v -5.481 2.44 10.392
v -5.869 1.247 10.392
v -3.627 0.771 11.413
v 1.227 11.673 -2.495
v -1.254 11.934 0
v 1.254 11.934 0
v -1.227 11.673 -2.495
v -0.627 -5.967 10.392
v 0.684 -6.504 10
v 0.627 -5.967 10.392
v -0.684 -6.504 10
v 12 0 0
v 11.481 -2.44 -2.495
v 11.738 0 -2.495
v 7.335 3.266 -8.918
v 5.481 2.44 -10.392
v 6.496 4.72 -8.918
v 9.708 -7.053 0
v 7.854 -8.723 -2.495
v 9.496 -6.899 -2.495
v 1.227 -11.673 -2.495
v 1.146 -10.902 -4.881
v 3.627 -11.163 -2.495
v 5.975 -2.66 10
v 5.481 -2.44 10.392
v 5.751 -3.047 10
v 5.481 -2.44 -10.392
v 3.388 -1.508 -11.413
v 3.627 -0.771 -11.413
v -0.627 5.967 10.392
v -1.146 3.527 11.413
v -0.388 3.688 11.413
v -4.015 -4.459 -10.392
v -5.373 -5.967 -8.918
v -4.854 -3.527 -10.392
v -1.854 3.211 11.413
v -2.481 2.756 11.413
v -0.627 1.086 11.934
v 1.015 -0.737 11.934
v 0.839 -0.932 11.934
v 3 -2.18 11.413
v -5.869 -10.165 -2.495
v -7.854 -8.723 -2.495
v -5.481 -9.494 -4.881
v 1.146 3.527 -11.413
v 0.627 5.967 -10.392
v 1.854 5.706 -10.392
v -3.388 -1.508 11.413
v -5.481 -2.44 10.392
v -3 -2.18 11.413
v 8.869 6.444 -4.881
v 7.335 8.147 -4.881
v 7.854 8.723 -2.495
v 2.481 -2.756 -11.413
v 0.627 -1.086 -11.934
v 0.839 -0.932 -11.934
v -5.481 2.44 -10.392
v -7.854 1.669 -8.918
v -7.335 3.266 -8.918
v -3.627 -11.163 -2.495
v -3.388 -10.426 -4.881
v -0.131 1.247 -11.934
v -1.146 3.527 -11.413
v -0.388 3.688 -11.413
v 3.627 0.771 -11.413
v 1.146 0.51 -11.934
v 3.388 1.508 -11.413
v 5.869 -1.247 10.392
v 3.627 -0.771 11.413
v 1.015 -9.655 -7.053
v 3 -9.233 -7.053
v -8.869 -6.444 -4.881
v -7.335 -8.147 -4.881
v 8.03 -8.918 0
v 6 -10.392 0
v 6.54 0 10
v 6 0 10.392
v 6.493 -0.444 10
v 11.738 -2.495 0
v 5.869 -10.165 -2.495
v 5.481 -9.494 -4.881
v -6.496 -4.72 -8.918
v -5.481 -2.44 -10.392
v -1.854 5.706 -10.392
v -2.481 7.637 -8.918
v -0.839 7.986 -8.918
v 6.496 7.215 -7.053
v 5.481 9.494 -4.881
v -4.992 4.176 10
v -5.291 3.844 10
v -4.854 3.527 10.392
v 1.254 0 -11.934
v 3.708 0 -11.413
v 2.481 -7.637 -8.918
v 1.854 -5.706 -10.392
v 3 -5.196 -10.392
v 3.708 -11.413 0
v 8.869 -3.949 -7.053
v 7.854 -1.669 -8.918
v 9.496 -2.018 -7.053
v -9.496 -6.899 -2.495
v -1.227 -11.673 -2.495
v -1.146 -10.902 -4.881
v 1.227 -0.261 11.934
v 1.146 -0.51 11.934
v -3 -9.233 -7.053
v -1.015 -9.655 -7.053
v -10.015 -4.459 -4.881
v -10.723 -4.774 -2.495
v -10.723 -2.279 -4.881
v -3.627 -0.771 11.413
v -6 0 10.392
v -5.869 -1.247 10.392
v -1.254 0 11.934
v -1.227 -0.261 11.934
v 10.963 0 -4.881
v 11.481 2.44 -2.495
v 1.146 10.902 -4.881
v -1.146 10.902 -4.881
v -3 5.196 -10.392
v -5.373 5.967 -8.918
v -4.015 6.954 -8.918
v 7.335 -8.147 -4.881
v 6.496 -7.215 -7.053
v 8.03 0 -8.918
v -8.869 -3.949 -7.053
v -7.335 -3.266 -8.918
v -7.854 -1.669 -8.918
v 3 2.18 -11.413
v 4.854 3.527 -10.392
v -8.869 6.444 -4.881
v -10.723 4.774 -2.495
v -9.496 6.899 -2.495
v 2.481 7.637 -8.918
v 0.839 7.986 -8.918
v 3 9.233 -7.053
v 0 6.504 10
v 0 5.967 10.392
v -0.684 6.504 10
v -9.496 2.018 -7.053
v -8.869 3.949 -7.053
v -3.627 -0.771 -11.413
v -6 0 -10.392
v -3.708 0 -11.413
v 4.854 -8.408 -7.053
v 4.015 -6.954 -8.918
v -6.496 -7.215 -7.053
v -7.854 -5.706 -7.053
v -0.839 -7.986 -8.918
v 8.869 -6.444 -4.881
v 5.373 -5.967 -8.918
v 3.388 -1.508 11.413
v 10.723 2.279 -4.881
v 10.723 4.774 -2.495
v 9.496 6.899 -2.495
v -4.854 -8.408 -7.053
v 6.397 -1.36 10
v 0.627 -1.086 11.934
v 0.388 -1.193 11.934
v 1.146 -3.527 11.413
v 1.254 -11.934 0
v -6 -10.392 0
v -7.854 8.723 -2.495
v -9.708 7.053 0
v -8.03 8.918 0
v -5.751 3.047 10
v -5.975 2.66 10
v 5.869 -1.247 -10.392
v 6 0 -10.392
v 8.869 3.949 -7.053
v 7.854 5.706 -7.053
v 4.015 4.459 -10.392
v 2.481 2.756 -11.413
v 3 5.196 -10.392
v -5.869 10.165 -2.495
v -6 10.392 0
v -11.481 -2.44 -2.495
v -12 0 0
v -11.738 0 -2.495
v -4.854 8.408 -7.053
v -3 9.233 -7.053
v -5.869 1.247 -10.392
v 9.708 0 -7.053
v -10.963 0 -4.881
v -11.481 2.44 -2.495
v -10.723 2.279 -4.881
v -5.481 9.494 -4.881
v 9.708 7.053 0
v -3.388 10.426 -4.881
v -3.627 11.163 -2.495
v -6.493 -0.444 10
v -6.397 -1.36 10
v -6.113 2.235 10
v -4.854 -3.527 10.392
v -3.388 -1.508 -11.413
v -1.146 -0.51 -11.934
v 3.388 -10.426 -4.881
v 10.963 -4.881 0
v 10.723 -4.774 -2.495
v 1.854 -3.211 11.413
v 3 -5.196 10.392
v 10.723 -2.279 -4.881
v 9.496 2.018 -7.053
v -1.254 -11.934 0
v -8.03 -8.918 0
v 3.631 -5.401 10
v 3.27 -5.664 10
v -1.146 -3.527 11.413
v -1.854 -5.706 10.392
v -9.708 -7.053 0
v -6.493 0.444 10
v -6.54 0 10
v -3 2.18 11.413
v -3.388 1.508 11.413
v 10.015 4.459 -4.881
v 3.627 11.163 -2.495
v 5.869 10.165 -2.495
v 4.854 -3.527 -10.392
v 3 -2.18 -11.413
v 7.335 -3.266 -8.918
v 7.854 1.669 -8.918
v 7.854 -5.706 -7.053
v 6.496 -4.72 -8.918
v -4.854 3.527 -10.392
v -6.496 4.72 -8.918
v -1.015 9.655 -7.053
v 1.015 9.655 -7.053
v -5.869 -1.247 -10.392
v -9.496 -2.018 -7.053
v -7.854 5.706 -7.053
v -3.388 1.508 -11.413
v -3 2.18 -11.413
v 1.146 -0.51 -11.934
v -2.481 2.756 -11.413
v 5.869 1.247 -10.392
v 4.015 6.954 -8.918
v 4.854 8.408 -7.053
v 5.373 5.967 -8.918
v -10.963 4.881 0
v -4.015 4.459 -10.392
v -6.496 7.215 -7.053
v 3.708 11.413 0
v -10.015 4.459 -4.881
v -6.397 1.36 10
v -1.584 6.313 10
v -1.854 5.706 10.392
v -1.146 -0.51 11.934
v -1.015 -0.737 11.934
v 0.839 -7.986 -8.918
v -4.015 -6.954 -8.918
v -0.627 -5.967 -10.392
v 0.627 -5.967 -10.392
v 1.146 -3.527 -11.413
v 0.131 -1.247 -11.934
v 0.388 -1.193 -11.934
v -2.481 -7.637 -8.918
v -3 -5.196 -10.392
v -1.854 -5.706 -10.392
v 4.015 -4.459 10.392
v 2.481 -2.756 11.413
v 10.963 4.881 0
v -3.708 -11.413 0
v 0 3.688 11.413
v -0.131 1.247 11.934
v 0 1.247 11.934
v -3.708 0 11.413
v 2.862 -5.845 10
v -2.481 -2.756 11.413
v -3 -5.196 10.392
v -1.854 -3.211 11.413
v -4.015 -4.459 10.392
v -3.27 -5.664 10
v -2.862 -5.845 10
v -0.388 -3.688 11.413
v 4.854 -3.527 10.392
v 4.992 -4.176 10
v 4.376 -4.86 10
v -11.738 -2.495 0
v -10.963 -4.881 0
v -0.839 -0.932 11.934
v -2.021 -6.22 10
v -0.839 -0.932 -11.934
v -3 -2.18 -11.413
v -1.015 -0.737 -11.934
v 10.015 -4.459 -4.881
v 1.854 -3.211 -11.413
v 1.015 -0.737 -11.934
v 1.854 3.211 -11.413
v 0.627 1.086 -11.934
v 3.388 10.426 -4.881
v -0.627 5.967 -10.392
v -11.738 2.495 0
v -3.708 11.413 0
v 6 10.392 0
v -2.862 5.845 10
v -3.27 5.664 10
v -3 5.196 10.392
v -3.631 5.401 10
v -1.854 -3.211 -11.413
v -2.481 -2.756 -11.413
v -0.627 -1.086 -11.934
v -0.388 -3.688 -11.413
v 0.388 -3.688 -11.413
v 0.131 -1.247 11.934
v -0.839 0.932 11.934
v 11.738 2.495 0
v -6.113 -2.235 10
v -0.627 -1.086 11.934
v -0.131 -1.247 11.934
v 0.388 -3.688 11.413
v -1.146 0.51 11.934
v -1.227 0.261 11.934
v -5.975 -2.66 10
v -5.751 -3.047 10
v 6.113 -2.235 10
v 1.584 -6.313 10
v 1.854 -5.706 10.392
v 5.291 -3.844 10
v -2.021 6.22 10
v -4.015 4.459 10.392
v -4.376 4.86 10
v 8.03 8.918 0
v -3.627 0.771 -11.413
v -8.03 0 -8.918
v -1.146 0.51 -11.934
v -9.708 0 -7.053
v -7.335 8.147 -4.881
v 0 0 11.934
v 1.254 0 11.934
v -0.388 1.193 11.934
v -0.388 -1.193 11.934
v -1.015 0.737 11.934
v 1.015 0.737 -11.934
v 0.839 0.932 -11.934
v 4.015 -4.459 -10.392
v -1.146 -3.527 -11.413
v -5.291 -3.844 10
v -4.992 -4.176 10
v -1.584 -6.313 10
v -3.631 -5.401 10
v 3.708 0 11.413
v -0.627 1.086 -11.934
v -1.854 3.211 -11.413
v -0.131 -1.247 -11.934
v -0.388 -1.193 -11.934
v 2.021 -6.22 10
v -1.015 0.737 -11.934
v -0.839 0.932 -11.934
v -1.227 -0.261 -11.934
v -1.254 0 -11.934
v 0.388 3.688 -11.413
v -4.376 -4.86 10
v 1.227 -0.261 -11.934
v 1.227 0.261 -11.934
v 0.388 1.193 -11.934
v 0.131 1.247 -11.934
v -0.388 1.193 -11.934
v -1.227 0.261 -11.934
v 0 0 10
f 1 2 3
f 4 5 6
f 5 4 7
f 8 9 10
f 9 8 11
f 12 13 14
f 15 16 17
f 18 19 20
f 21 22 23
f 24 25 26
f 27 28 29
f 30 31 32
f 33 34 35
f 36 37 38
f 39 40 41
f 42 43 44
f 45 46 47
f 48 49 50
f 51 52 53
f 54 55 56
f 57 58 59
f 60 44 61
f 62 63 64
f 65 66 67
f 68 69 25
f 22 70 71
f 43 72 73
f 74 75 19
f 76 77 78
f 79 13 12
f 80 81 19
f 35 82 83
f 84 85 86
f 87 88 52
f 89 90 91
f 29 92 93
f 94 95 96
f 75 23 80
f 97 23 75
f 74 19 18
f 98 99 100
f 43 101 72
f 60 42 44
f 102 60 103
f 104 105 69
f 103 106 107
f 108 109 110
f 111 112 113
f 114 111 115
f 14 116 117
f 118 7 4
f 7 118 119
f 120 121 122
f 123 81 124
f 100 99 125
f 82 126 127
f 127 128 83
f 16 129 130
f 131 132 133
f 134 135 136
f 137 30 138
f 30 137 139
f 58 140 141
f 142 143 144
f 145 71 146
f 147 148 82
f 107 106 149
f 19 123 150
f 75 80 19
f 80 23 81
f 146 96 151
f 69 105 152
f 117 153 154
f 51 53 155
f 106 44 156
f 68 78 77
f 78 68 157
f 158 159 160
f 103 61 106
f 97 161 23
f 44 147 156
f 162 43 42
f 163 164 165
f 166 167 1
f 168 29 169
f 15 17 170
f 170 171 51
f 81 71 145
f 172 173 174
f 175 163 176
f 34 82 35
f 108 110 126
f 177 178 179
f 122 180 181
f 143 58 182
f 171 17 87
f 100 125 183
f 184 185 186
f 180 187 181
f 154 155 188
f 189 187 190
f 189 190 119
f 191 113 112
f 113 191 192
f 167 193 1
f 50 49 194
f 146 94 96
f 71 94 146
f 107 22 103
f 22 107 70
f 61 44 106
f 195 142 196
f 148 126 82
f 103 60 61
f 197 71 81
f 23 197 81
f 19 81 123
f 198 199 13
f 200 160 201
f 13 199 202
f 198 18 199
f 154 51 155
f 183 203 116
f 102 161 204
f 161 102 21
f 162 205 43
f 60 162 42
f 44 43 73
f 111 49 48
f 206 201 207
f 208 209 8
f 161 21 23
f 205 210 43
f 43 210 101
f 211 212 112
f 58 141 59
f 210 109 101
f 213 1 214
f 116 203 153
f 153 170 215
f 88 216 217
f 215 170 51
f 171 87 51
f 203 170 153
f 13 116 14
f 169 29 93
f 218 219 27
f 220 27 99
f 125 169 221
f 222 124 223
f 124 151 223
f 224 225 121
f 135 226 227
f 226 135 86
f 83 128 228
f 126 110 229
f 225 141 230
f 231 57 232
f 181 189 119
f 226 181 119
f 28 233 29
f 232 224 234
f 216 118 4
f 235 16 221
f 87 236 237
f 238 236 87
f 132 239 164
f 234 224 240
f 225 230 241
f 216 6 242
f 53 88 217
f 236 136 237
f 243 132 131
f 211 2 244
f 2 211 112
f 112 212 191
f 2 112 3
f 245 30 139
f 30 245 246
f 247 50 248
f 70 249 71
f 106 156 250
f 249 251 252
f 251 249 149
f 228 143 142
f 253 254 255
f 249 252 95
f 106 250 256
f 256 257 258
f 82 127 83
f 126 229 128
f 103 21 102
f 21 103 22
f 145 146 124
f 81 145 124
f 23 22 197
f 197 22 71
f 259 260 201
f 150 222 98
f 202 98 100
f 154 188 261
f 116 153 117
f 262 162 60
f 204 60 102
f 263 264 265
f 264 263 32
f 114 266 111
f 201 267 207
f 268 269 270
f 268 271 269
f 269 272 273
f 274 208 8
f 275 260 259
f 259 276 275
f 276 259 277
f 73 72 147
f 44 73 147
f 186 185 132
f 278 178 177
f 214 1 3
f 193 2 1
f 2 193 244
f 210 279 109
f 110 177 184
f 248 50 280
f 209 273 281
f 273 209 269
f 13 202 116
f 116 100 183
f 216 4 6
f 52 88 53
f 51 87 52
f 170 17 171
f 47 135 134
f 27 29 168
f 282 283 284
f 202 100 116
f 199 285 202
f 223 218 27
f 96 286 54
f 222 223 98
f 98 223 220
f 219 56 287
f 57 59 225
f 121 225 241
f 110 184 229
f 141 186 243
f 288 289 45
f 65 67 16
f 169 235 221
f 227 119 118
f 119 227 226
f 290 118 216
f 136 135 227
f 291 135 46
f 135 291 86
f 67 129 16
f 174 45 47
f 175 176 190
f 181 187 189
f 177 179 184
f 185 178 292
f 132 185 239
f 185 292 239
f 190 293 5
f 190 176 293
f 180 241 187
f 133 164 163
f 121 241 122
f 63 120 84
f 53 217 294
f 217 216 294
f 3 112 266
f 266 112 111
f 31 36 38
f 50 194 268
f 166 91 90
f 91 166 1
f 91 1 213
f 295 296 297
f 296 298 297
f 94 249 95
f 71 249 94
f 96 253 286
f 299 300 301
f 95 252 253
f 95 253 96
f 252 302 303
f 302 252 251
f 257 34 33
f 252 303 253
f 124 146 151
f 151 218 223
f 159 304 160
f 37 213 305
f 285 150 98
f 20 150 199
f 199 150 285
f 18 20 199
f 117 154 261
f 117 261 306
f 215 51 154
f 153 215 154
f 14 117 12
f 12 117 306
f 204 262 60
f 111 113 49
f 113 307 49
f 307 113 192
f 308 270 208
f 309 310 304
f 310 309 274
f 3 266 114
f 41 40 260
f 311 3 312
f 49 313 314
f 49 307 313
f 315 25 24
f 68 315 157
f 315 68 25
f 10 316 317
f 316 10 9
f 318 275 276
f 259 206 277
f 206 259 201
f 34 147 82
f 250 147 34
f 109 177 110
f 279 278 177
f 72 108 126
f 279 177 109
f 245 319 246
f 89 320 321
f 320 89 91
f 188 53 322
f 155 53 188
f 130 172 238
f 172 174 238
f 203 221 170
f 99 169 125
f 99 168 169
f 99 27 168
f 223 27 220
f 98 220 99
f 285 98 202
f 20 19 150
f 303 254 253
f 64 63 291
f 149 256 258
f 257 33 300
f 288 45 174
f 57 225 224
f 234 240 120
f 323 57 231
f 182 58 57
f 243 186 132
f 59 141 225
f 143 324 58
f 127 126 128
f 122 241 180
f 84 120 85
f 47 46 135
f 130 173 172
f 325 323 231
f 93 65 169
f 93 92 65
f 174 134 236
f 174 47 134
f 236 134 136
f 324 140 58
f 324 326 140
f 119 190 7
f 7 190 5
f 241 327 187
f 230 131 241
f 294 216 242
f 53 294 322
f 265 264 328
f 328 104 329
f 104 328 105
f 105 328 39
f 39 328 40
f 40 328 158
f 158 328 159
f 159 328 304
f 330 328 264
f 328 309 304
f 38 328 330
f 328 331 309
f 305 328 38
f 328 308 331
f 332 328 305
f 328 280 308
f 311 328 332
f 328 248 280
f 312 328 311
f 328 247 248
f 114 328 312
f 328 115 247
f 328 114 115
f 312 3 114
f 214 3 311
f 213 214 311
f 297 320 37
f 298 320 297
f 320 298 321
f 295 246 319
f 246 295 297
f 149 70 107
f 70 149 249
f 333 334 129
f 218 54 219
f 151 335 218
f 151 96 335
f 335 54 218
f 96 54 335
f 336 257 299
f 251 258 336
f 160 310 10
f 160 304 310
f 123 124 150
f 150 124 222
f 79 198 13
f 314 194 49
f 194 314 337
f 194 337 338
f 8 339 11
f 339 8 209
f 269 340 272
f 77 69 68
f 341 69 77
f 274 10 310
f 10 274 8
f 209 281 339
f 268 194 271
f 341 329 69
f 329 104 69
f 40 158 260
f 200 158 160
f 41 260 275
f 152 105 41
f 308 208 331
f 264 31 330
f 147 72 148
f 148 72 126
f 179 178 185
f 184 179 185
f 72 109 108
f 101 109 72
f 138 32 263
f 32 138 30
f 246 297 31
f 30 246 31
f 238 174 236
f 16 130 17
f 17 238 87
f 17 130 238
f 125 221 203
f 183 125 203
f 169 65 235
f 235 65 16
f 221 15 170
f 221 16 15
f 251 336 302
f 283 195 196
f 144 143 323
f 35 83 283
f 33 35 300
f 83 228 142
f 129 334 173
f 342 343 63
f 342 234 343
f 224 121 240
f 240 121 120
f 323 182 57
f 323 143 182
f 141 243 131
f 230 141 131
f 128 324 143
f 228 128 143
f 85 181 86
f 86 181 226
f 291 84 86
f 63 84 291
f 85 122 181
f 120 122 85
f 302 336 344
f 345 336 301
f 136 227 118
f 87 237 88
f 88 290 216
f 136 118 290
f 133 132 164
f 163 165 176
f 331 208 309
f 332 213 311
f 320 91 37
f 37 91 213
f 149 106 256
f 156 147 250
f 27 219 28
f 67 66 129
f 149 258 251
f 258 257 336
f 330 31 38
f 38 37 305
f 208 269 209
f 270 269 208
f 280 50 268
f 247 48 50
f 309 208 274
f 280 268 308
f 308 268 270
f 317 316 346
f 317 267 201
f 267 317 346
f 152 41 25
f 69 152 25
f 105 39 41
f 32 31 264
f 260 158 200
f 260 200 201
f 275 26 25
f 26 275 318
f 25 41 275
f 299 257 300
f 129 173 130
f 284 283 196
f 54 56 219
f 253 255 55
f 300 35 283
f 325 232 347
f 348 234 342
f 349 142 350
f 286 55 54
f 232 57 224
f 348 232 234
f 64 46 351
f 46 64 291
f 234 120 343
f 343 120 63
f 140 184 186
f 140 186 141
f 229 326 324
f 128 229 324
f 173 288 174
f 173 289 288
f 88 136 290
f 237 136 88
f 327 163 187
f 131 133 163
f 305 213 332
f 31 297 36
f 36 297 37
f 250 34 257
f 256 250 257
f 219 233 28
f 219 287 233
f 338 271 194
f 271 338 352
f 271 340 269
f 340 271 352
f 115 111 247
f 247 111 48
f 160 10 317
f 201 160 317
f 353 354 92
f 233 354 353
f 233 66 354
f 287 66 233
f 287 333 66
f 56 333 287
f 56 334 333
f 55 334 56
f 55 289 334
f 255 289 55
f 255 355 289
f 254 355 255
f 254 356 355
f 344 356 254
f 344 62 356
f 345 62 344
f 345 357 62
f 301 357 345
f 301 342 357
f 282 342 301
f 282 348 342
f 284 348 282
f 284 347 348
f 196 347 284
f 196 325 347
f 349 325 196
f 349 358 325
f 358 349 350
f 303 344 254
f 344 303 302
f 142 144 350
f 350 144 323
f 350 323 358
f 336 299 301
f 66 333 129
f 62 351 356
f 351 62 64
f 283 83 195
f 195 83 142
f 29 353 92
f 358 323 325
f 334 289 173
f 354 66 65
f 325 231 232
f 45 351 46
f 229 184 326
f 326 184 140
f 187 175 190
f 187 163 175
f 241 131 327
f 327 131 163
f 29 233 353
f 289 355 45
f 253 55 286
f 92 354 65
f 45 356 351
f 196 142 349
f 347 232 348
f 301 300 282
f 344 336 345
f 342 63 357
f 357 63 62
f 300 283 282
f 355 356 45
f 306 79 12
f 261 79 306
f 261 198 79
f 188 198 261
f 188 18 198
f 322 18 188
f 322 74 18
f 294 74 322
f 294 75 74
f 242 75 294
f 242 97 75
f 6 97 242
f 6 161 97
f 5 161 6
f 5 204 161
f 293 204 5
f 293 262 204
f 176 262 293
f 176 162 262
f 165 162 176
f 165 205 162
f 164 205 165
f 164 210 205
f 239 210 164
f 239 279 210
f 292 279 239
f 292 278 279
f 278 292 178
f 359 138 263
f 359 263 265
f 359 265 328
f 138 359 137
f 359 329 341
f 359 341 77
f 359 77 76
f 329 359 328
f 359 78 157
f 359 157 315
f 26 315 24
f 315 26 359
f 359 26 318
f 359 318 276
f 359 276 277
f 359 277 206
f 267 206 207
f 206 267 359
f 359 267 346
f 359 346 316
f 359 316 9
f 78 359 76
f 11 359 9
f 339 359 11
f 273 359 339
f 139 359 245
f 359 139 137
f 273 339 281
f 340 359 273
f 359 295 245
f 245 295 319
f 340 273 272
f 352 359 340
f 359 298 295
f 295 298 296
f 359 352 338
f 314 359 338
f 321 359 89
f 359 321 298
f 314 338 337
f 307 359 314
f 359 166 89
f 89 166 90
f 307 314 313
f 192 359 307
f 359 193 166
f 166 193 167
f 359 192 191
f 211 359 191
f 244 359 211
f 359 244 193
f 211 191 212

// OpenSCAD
// Generated by generate_scads.py
intersection() {
  difference() {
    sphere(r=12);
    cube(size=[20,10,20], center=false);
    cylinder(h=10, r=12, center=false);
  }
}
